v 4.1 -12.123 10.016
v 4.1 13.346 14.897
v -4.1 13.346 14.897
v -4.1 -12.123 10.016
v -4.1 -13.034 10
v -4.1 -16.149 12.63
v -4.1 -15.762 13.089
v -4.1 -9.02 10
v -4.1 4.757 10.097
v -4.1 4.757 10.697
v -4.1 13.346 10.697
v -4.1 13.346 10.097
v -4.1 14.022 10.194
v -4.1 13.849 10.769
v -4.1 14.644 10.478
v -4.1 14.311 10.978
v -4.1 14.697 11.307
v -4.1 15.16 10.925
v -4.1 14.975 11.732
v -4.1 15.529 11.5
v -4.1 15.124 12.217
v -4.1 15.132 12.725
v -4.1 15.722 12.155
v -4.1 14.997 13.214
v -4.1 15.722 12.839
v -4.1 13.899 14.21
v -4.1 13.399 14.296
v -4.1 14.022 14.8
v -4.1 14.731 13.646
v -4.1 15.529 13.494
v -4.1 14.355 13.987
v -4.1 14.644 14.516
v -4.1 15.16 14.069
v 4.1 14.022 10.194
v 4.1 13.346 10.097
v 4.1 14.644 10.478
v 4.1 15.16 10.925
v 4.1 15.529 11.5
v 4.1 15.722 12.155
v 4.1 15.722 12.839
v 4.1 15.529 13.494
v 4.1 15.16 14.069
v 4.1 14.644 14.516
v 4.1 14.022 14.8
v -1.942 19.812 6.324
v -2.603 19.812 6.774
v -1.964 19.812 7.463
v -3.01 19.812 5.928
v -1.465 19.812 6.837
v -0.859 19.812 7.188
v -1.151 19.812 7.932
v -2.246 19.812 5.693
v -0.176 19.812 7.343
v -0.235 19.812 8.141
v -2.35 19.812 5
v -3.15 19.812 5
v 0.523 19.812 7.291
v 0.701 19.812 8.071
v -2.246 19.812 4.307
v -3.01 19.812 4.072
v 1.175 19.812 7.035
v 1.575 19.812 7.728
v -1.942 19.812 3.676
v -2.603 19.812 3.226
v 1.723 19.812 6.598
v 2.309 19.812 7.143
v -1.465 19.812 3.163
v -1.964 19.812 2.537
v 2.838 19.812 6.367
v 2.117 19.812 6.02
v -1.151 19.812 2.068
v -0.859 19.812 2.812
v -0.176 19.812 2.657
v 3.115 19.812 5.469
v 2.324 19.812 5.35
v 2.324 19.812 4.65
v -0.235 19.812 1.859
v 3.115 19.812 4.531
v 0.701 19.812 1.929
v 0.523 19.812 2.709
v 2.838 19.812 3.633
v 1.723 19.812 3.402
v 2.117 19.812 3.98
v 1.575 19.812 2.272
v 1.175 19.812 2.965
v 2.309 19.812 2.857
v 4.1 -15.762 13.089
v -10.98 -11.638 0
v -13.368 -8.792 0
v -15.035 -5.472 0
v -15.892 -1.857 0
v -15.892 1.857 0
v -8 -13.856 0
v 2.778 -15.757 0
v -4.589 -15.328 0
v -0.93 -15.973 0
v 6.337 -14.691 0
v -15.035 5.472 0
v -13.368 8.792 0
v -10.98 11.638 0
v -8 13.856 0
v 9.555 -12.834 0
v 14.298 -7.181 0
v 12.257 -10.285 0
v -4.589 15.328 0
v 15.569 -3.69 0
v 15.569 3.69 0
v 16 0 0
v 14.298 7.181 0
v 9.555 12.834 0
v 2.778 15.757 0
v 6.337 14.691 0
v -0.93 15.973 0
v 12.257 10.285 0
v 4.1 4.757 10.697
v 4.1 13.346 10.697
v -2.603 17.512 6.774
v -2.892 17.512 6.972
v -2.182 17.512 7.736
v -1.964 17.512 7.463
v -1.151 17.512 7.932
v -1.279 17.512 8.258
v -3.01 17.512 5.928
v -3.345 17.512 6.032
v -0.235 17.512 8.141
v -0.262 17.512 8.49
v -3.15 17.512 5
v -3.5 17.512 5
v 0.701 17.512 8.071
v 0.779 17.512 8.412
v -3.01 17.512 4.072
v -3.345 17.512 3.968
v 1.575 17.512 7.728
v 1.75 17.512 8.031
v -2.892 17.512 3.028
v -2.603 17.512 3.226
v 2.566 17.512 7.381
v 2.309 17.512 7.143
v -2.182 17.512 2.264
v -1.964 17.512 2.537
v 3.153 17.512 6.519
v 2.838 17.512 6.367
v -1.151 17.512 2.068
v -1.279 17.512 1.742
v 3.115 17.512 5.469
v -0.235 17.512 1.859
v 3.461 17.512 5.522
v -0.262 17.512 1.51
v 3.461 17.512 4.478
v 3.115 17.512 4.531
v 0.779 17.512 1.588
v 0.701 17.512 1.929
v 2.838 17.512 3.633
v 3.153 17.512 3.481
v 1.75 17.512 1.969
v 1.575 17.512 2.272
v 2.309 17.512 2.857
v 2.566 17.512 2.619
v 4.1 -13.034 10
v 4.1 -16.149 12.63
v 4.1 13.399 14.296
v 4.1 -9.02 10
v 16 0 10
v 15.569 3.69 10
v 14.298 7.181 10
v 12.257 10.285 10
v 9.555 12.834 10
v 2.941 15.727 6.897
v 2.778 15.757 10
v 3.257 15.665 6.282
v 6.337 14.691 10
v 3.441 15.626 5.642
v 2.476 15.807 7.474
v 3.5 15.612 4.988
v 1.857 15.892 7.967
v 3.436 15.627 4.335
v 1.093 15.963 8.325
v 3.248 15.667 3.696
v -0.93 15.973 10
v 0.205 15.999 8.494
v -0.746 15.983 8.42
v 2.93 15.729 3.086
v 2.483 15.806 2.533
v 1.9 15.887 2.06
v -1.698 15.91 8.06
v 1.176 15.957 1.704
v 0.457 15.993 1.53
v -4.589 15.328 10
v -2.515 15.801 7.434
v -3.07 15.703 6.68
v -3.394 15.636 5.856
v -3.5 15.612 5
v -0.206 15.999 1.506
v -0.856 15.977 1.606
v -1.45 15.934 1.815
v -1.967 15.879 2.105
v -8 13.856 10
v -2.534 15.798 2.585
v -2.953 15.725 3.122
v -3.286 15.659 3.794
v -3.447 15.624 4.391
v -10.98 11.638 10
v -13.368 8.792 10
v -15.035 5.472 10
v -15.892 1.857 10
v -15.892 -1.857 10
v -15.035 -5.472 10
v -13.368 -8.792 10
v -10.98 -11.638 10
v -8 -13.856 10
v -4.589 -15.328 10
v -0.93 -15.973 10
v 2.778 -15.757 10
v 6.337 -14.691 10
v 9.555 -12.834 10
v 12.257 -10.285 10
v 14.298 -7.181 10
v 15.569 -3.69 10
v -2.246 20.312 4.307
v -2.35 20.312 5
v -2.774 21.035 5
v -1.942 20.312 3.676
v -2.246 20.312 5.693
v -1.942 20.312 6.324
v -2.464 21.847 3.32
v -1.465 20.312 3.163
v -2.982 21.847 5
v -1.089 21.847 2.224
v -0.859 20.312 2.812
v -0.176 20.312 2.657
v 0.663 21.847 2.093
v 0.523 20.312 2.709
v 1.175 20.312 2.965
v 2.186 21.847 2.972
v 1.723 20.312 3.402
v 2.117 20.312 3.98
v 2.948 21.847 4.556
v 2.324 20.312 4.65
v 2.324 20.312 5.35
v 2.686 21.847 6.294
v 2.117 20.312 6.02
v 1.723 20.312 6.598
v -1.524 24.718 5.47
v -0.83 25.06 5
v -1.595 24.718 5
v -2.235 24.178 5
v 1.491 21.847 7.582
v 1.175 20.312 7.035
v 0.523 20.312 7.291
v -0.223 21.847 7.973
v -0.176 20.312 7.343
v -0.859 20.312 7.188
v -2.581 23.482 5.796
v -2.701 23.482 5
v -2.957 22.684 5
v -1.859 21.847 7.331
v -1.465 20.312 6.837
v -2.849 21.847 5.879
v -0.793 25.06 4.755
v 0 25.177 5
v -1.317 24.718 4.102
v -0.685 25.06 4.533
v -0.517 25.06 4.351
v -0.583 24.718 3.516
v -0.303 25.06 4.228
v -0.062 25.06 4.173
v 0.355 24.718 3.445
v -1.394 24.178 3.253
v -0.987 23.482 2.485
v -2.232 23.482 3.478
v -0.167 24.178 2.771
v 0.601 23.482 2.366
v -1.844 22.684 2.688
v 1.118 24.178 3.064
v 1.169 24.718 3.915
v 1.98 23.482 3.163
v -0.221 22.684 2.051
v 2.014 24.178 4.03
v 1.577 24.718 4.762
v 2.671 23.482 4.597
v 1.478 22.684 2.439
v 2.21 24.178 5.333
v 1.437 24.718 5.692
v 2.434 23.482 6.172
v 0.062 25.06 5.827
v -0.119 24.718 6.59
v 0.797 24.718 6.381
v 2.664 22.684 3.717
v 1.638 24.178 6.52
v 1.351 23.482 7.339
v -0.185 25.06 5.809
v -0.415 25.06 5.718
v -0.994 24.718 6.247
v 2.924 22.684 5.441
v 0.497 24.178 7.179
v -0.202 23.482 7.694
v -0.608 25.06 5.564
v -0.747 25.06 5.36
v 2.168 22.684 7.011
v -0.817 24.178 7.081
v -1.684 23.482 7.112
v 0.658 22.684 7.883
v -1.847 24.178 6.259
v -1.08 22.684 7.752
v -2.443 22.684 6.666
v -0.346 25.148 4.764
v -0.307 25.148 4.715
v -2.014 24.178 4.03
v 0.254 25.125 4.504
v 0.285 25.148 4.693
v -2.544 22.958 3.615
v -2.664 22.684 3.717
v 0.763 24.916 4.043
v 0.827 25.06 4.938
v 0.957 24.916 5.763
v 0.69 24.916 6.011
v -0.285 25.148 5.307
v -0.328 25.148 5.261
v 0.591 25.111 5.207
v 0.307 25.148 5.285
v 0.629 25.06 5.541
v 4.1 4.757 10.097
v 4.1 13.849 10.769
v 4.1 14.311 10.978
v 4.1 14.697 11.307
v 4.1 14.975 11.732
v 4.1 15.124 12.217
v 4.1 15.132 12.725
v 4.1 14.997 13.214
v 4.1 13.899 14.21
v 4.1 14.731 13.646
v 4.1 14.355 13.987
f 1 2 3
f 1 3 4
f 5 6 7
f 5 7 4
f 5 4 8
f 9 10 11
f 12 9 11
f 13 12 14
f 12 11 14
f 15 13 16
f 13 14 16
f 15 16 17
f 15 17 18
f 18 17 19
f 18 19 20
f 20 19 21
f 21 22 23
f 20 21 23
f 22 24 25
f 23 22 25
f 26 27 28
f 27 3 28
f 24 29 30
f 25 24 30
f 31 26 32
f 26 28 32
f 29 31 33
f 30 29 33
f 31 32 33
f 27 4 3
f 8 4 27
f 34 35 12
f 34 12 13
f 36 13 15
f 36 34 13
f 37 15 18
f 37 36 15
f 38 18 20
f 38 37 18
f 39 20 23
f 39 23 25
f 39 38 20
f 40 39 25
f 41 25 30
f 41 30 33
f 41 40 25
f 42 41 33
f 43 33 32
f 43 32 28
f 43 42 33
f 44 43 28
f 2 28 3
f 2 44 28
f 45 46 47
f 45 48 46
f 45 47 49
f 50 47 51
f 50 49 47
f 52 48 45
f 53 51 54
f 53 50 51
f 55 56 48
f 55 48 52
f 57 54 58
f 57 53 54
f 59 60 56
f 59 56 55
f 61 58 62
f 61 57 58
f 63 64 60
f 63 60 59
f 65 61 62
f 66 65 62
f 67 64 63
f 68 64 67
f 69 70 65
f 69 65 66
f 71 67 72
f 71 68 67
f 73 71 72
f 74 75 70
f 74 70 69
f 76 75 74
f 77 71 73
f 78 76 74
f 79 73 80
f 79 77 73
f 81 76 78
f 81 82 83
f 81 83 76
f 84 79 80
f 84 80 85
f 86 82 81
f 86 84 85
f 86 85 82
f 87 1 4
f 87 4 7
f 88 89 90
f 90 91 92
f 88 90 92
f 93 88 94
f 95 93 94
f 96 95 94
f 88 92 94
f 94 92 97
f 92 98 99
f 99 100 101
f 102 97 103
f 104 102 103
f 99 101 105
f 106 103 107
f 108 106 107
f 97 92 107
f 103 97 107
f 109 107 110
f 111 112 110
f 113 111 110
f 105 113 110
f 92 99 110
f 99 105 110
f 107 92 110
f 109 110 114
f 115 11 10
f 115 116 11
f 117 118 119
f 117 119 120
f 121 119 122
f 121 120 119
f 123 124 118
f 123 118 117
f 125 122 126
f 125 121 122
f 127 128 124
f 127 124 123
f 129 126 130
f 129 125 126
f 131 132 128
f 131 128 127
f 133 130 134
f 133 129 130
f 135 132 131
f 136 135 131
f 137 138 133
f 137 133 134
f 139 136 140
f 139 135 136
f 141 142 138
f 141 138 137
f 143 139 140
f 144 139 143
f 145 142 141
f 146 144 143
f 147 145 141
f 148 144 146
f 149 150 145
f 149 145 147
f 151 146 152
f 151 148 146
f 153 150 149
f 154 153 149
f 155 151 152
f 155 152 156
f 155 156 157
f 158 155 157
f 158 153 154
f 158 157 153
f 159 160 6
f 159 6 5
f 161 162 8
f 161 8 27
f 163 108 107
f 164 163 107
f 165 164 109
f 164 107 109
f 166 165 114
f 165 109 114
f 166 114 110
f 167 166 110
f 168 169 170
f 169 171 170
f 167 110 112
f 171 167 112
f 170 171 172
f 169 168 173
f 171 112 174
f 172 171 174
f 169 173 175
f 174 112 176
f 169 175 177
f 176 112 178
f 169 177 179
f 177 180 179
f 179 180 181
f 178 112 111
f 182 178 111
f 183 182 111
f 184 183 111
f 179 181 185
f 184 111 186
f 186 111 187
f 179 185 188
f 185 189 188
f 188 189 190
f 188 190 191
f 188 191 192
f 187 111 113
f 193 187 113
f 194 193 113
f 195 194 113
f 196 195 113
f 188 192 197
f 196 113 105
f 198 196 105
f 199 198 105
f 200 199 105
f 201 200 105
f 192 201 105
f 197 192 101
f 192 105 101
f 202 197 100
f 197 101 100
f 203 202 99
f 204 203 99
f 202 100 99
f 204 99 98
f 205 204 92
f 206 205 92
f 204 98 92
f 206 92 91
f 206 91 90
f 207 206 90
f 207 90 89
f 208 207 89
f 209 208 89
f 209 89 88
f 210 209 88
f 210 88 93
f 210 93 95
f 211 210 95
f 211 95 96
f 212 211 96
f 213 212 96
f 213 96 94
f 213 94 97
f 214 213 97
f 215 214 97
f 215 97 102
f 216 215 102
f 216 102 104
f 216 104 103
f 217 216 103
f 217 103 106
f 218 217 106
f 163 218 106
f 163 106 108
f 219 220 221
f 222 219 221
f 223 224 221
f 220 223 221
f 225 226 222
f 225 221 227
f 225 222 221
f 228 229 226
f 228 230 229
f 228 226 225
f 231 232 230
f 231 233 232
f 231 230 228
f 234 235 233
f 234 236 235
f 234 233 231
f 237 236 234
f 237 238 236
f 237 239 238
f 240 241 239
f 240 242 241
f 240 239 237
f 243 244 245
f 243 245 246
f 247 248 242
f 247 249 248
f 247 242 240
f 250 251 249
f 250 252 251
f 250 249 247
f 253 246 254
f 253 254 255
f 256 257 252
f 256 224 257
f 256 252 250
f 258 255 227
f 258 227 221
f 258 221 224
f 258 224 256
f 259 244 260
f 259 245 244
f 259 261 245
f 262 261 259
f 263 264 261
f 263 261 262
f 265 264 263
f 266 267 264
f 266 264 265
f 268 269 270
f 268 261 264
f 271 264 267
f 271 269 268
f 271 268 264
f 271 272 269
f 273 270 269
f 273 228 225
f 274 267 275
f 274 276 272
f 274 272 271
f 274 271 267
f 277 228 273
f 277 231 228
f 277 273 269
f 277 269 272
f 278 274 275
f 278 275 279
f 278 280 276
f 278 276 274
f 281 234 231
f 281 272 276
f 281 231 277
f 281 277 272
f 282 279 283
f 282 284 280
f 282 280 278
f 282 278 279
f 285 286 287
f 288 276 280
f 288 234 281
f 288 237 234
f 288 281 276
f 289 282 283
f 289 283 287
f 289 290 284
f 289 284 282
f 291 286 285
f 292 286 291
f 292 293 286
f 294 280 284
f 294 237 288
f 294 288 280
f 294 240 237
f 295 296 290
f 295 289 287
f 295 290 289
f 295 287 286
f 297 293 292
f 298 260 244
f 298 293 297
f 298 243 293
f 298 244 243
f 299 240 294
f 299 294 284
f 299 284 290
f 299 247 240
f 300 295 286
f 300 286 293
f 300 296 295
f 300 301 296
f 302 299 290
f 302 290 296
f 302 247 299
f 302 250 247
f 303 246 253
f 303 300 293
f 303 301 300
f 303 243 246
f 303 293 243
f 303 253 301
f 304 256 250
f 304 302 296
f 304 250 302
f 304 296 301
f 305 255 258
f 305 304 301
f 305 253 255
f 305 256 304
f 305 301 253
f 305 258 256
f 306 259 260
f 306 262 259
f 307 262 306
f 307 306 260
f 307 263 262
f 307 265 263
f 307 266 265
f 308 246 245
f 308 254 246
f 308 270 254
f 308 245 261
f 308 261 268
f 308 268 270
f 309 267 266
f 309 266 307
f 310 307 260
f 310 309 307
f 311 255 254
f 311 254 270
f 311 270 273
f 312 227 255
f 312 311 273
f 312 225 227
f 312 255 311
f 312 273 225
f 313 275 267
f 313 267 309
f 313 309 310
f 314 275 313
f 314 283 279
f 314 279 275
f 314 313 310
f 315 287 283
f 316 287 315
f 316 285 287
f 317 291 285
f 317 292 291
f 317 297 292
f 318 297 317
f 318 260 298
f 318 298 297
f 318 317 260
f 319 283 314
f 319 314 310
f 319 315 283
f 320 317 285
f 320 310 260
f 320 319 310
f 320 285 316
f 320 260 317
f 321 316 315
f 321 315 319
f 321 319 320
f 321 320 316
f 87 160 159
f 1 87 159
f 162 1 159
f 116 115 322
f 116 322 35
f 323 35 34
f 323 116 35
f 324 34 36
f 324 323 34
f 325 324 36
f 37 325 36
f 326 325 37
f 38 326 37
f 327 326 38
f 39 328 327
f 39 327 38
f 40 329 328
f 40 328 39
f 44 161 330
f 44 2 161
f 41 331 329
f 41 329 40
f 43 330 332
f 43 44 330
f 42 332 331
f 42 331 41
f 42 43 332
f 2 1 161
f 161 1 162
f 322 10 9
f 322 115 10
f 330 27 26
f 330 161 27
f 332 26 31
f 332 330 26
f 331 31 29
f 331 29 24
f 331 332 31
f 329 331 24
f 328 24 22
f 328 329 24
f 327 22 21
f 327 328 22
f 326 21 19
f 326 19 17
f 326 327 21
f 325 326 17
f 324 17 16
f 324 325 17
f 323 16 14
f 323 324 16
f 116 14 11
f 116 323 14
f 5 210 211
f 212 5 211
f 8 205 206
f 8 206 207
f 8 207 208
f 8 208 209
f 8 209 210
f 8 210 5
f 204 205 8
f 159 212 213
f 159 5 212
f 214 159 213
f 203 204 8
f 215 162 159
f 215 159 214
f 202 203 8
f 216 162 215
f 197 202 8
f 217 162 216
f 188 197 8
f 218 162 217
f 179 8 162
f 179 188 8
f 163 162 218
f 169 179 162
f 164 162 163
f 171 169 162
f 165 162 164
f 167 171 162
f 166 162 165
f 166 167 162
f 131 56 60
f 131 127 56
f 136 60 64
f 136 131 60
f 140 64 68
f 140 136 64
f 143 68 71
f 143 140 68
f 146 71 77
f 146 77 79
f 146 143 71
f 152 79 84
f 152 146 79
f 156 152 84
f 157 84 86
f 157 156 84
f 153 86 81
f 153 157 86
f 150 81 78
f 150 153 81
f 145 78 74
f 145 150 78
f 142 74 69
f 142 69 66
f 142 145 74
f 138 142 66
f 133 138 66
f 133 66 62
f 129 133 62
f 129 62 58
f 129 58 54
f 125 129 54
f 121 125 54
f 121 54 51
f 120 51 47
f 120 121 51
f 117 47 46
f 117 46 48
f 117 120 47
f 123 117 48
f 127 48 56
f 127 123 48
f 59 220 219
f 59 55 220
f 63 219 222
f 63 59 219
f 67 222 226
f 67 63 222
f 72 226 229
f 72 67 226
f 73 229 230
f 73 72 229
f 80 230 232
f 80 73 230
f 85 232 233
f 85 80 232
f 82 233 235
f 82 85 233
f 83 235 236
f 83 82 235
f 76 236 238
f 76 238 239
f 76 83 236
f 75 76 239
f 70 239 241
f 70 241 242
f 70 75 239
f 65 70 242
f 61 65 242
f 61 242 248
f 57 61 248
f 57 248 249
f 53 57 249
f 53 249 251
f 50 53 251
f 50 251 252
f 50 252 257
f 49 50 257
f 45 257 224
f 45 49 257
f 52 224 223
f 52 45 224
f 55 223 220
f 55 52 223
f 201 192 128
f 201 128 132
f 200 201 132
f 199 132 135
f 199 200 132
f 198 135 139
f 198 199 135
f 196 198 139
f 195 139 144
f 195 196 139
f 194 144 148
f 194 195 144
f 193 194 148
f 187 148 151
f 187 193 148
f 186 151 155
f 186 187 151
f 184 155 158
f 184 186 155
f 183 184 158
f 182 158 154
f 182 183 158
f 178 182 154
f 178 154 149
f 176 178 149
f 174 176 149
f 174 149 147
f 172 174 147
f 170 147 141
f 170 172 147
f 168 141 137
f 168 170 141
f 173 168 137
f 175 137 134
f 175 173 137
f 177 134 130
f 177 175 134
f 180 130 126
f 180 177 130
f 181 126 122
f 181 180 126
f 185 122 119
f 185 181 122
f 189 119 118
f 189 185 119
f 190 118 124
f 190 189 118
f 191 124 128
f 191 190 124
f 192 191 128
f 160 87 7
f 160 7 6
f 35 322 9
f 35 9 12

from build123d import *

# Parameters (mm, degrees)
F0_R     = 16
F1_DEPTH = 10
F3_DEPTH = 4.1


with BuildPart() as f1:
    # F0 (on Top) → F1 (new body)
    with BuildSketch(Plane.XY):
        Circle(F0_R)
    extrude(amount=F1_DEPTH)

    # F2 (on Right) → F3 (join, symmetric)
    with BuildSketch(Plane.YZ):
        with BuildLine():
            Line((4.757335, 10.697019), (4.757335, 10.097019))
            Line((4.757335, 10.097019), (13.346032, 10.097019))
            ThreePointArc((13.346032, 10.097019), (15.746032, 12.497019), (13.346032, 14.897019))
            Line((13.346032, 14.897019), (-12.123428, 10.016164))
            Line((-12.123428, 10.016164), (-15.761921, 13.08867))
            Line((-15.761921, 13.08867), (-16.14903, 12.630252))
            Line((-16.14903, 12.630252), (-12.291747, 9.37299))
            Line((-12.291747, 9.37299), (13.398945, 14.296242))
            ThreePointArc((13.398945, 14.296242), (15.145838, 12.47056), (13.346032, 10.697019))
            Line((13.346032, 10.697019), (4.757335, 10.697019))
        make_face()
    extrude(amount=F3_DEPTH, both=True)

    # F5 (on offset) → F6 (revolve)
    with BuildSketch(Plane.XY.offset(5)):
        with BuildLine():
            Line((-3.5, 15.612495), (0, 15.612495))
            Line((0, 15.612495), (0, 25.177301))
            ThreePointArc((0, 25.177301), (-2.701335, 23.482211), (-2.35, 20.312495))
            Line((-2.35, 20.312495), (-2.35, 19.812495))
            Line((-2.35, 19.812495), (-3.15, 19.812495))
            Line((-3.15, 19.812495), (-3.15, 17.512495))
            Line((-3.15, 17.512495), (-3.5, 17.512495))
            Line((-3.5, 17.512495), (-3.5, 15.612495))
        make_face()
    revolve(axis=Axis((0, 20.394898, 5), (0, -1, 0)))


solid = f1.part
